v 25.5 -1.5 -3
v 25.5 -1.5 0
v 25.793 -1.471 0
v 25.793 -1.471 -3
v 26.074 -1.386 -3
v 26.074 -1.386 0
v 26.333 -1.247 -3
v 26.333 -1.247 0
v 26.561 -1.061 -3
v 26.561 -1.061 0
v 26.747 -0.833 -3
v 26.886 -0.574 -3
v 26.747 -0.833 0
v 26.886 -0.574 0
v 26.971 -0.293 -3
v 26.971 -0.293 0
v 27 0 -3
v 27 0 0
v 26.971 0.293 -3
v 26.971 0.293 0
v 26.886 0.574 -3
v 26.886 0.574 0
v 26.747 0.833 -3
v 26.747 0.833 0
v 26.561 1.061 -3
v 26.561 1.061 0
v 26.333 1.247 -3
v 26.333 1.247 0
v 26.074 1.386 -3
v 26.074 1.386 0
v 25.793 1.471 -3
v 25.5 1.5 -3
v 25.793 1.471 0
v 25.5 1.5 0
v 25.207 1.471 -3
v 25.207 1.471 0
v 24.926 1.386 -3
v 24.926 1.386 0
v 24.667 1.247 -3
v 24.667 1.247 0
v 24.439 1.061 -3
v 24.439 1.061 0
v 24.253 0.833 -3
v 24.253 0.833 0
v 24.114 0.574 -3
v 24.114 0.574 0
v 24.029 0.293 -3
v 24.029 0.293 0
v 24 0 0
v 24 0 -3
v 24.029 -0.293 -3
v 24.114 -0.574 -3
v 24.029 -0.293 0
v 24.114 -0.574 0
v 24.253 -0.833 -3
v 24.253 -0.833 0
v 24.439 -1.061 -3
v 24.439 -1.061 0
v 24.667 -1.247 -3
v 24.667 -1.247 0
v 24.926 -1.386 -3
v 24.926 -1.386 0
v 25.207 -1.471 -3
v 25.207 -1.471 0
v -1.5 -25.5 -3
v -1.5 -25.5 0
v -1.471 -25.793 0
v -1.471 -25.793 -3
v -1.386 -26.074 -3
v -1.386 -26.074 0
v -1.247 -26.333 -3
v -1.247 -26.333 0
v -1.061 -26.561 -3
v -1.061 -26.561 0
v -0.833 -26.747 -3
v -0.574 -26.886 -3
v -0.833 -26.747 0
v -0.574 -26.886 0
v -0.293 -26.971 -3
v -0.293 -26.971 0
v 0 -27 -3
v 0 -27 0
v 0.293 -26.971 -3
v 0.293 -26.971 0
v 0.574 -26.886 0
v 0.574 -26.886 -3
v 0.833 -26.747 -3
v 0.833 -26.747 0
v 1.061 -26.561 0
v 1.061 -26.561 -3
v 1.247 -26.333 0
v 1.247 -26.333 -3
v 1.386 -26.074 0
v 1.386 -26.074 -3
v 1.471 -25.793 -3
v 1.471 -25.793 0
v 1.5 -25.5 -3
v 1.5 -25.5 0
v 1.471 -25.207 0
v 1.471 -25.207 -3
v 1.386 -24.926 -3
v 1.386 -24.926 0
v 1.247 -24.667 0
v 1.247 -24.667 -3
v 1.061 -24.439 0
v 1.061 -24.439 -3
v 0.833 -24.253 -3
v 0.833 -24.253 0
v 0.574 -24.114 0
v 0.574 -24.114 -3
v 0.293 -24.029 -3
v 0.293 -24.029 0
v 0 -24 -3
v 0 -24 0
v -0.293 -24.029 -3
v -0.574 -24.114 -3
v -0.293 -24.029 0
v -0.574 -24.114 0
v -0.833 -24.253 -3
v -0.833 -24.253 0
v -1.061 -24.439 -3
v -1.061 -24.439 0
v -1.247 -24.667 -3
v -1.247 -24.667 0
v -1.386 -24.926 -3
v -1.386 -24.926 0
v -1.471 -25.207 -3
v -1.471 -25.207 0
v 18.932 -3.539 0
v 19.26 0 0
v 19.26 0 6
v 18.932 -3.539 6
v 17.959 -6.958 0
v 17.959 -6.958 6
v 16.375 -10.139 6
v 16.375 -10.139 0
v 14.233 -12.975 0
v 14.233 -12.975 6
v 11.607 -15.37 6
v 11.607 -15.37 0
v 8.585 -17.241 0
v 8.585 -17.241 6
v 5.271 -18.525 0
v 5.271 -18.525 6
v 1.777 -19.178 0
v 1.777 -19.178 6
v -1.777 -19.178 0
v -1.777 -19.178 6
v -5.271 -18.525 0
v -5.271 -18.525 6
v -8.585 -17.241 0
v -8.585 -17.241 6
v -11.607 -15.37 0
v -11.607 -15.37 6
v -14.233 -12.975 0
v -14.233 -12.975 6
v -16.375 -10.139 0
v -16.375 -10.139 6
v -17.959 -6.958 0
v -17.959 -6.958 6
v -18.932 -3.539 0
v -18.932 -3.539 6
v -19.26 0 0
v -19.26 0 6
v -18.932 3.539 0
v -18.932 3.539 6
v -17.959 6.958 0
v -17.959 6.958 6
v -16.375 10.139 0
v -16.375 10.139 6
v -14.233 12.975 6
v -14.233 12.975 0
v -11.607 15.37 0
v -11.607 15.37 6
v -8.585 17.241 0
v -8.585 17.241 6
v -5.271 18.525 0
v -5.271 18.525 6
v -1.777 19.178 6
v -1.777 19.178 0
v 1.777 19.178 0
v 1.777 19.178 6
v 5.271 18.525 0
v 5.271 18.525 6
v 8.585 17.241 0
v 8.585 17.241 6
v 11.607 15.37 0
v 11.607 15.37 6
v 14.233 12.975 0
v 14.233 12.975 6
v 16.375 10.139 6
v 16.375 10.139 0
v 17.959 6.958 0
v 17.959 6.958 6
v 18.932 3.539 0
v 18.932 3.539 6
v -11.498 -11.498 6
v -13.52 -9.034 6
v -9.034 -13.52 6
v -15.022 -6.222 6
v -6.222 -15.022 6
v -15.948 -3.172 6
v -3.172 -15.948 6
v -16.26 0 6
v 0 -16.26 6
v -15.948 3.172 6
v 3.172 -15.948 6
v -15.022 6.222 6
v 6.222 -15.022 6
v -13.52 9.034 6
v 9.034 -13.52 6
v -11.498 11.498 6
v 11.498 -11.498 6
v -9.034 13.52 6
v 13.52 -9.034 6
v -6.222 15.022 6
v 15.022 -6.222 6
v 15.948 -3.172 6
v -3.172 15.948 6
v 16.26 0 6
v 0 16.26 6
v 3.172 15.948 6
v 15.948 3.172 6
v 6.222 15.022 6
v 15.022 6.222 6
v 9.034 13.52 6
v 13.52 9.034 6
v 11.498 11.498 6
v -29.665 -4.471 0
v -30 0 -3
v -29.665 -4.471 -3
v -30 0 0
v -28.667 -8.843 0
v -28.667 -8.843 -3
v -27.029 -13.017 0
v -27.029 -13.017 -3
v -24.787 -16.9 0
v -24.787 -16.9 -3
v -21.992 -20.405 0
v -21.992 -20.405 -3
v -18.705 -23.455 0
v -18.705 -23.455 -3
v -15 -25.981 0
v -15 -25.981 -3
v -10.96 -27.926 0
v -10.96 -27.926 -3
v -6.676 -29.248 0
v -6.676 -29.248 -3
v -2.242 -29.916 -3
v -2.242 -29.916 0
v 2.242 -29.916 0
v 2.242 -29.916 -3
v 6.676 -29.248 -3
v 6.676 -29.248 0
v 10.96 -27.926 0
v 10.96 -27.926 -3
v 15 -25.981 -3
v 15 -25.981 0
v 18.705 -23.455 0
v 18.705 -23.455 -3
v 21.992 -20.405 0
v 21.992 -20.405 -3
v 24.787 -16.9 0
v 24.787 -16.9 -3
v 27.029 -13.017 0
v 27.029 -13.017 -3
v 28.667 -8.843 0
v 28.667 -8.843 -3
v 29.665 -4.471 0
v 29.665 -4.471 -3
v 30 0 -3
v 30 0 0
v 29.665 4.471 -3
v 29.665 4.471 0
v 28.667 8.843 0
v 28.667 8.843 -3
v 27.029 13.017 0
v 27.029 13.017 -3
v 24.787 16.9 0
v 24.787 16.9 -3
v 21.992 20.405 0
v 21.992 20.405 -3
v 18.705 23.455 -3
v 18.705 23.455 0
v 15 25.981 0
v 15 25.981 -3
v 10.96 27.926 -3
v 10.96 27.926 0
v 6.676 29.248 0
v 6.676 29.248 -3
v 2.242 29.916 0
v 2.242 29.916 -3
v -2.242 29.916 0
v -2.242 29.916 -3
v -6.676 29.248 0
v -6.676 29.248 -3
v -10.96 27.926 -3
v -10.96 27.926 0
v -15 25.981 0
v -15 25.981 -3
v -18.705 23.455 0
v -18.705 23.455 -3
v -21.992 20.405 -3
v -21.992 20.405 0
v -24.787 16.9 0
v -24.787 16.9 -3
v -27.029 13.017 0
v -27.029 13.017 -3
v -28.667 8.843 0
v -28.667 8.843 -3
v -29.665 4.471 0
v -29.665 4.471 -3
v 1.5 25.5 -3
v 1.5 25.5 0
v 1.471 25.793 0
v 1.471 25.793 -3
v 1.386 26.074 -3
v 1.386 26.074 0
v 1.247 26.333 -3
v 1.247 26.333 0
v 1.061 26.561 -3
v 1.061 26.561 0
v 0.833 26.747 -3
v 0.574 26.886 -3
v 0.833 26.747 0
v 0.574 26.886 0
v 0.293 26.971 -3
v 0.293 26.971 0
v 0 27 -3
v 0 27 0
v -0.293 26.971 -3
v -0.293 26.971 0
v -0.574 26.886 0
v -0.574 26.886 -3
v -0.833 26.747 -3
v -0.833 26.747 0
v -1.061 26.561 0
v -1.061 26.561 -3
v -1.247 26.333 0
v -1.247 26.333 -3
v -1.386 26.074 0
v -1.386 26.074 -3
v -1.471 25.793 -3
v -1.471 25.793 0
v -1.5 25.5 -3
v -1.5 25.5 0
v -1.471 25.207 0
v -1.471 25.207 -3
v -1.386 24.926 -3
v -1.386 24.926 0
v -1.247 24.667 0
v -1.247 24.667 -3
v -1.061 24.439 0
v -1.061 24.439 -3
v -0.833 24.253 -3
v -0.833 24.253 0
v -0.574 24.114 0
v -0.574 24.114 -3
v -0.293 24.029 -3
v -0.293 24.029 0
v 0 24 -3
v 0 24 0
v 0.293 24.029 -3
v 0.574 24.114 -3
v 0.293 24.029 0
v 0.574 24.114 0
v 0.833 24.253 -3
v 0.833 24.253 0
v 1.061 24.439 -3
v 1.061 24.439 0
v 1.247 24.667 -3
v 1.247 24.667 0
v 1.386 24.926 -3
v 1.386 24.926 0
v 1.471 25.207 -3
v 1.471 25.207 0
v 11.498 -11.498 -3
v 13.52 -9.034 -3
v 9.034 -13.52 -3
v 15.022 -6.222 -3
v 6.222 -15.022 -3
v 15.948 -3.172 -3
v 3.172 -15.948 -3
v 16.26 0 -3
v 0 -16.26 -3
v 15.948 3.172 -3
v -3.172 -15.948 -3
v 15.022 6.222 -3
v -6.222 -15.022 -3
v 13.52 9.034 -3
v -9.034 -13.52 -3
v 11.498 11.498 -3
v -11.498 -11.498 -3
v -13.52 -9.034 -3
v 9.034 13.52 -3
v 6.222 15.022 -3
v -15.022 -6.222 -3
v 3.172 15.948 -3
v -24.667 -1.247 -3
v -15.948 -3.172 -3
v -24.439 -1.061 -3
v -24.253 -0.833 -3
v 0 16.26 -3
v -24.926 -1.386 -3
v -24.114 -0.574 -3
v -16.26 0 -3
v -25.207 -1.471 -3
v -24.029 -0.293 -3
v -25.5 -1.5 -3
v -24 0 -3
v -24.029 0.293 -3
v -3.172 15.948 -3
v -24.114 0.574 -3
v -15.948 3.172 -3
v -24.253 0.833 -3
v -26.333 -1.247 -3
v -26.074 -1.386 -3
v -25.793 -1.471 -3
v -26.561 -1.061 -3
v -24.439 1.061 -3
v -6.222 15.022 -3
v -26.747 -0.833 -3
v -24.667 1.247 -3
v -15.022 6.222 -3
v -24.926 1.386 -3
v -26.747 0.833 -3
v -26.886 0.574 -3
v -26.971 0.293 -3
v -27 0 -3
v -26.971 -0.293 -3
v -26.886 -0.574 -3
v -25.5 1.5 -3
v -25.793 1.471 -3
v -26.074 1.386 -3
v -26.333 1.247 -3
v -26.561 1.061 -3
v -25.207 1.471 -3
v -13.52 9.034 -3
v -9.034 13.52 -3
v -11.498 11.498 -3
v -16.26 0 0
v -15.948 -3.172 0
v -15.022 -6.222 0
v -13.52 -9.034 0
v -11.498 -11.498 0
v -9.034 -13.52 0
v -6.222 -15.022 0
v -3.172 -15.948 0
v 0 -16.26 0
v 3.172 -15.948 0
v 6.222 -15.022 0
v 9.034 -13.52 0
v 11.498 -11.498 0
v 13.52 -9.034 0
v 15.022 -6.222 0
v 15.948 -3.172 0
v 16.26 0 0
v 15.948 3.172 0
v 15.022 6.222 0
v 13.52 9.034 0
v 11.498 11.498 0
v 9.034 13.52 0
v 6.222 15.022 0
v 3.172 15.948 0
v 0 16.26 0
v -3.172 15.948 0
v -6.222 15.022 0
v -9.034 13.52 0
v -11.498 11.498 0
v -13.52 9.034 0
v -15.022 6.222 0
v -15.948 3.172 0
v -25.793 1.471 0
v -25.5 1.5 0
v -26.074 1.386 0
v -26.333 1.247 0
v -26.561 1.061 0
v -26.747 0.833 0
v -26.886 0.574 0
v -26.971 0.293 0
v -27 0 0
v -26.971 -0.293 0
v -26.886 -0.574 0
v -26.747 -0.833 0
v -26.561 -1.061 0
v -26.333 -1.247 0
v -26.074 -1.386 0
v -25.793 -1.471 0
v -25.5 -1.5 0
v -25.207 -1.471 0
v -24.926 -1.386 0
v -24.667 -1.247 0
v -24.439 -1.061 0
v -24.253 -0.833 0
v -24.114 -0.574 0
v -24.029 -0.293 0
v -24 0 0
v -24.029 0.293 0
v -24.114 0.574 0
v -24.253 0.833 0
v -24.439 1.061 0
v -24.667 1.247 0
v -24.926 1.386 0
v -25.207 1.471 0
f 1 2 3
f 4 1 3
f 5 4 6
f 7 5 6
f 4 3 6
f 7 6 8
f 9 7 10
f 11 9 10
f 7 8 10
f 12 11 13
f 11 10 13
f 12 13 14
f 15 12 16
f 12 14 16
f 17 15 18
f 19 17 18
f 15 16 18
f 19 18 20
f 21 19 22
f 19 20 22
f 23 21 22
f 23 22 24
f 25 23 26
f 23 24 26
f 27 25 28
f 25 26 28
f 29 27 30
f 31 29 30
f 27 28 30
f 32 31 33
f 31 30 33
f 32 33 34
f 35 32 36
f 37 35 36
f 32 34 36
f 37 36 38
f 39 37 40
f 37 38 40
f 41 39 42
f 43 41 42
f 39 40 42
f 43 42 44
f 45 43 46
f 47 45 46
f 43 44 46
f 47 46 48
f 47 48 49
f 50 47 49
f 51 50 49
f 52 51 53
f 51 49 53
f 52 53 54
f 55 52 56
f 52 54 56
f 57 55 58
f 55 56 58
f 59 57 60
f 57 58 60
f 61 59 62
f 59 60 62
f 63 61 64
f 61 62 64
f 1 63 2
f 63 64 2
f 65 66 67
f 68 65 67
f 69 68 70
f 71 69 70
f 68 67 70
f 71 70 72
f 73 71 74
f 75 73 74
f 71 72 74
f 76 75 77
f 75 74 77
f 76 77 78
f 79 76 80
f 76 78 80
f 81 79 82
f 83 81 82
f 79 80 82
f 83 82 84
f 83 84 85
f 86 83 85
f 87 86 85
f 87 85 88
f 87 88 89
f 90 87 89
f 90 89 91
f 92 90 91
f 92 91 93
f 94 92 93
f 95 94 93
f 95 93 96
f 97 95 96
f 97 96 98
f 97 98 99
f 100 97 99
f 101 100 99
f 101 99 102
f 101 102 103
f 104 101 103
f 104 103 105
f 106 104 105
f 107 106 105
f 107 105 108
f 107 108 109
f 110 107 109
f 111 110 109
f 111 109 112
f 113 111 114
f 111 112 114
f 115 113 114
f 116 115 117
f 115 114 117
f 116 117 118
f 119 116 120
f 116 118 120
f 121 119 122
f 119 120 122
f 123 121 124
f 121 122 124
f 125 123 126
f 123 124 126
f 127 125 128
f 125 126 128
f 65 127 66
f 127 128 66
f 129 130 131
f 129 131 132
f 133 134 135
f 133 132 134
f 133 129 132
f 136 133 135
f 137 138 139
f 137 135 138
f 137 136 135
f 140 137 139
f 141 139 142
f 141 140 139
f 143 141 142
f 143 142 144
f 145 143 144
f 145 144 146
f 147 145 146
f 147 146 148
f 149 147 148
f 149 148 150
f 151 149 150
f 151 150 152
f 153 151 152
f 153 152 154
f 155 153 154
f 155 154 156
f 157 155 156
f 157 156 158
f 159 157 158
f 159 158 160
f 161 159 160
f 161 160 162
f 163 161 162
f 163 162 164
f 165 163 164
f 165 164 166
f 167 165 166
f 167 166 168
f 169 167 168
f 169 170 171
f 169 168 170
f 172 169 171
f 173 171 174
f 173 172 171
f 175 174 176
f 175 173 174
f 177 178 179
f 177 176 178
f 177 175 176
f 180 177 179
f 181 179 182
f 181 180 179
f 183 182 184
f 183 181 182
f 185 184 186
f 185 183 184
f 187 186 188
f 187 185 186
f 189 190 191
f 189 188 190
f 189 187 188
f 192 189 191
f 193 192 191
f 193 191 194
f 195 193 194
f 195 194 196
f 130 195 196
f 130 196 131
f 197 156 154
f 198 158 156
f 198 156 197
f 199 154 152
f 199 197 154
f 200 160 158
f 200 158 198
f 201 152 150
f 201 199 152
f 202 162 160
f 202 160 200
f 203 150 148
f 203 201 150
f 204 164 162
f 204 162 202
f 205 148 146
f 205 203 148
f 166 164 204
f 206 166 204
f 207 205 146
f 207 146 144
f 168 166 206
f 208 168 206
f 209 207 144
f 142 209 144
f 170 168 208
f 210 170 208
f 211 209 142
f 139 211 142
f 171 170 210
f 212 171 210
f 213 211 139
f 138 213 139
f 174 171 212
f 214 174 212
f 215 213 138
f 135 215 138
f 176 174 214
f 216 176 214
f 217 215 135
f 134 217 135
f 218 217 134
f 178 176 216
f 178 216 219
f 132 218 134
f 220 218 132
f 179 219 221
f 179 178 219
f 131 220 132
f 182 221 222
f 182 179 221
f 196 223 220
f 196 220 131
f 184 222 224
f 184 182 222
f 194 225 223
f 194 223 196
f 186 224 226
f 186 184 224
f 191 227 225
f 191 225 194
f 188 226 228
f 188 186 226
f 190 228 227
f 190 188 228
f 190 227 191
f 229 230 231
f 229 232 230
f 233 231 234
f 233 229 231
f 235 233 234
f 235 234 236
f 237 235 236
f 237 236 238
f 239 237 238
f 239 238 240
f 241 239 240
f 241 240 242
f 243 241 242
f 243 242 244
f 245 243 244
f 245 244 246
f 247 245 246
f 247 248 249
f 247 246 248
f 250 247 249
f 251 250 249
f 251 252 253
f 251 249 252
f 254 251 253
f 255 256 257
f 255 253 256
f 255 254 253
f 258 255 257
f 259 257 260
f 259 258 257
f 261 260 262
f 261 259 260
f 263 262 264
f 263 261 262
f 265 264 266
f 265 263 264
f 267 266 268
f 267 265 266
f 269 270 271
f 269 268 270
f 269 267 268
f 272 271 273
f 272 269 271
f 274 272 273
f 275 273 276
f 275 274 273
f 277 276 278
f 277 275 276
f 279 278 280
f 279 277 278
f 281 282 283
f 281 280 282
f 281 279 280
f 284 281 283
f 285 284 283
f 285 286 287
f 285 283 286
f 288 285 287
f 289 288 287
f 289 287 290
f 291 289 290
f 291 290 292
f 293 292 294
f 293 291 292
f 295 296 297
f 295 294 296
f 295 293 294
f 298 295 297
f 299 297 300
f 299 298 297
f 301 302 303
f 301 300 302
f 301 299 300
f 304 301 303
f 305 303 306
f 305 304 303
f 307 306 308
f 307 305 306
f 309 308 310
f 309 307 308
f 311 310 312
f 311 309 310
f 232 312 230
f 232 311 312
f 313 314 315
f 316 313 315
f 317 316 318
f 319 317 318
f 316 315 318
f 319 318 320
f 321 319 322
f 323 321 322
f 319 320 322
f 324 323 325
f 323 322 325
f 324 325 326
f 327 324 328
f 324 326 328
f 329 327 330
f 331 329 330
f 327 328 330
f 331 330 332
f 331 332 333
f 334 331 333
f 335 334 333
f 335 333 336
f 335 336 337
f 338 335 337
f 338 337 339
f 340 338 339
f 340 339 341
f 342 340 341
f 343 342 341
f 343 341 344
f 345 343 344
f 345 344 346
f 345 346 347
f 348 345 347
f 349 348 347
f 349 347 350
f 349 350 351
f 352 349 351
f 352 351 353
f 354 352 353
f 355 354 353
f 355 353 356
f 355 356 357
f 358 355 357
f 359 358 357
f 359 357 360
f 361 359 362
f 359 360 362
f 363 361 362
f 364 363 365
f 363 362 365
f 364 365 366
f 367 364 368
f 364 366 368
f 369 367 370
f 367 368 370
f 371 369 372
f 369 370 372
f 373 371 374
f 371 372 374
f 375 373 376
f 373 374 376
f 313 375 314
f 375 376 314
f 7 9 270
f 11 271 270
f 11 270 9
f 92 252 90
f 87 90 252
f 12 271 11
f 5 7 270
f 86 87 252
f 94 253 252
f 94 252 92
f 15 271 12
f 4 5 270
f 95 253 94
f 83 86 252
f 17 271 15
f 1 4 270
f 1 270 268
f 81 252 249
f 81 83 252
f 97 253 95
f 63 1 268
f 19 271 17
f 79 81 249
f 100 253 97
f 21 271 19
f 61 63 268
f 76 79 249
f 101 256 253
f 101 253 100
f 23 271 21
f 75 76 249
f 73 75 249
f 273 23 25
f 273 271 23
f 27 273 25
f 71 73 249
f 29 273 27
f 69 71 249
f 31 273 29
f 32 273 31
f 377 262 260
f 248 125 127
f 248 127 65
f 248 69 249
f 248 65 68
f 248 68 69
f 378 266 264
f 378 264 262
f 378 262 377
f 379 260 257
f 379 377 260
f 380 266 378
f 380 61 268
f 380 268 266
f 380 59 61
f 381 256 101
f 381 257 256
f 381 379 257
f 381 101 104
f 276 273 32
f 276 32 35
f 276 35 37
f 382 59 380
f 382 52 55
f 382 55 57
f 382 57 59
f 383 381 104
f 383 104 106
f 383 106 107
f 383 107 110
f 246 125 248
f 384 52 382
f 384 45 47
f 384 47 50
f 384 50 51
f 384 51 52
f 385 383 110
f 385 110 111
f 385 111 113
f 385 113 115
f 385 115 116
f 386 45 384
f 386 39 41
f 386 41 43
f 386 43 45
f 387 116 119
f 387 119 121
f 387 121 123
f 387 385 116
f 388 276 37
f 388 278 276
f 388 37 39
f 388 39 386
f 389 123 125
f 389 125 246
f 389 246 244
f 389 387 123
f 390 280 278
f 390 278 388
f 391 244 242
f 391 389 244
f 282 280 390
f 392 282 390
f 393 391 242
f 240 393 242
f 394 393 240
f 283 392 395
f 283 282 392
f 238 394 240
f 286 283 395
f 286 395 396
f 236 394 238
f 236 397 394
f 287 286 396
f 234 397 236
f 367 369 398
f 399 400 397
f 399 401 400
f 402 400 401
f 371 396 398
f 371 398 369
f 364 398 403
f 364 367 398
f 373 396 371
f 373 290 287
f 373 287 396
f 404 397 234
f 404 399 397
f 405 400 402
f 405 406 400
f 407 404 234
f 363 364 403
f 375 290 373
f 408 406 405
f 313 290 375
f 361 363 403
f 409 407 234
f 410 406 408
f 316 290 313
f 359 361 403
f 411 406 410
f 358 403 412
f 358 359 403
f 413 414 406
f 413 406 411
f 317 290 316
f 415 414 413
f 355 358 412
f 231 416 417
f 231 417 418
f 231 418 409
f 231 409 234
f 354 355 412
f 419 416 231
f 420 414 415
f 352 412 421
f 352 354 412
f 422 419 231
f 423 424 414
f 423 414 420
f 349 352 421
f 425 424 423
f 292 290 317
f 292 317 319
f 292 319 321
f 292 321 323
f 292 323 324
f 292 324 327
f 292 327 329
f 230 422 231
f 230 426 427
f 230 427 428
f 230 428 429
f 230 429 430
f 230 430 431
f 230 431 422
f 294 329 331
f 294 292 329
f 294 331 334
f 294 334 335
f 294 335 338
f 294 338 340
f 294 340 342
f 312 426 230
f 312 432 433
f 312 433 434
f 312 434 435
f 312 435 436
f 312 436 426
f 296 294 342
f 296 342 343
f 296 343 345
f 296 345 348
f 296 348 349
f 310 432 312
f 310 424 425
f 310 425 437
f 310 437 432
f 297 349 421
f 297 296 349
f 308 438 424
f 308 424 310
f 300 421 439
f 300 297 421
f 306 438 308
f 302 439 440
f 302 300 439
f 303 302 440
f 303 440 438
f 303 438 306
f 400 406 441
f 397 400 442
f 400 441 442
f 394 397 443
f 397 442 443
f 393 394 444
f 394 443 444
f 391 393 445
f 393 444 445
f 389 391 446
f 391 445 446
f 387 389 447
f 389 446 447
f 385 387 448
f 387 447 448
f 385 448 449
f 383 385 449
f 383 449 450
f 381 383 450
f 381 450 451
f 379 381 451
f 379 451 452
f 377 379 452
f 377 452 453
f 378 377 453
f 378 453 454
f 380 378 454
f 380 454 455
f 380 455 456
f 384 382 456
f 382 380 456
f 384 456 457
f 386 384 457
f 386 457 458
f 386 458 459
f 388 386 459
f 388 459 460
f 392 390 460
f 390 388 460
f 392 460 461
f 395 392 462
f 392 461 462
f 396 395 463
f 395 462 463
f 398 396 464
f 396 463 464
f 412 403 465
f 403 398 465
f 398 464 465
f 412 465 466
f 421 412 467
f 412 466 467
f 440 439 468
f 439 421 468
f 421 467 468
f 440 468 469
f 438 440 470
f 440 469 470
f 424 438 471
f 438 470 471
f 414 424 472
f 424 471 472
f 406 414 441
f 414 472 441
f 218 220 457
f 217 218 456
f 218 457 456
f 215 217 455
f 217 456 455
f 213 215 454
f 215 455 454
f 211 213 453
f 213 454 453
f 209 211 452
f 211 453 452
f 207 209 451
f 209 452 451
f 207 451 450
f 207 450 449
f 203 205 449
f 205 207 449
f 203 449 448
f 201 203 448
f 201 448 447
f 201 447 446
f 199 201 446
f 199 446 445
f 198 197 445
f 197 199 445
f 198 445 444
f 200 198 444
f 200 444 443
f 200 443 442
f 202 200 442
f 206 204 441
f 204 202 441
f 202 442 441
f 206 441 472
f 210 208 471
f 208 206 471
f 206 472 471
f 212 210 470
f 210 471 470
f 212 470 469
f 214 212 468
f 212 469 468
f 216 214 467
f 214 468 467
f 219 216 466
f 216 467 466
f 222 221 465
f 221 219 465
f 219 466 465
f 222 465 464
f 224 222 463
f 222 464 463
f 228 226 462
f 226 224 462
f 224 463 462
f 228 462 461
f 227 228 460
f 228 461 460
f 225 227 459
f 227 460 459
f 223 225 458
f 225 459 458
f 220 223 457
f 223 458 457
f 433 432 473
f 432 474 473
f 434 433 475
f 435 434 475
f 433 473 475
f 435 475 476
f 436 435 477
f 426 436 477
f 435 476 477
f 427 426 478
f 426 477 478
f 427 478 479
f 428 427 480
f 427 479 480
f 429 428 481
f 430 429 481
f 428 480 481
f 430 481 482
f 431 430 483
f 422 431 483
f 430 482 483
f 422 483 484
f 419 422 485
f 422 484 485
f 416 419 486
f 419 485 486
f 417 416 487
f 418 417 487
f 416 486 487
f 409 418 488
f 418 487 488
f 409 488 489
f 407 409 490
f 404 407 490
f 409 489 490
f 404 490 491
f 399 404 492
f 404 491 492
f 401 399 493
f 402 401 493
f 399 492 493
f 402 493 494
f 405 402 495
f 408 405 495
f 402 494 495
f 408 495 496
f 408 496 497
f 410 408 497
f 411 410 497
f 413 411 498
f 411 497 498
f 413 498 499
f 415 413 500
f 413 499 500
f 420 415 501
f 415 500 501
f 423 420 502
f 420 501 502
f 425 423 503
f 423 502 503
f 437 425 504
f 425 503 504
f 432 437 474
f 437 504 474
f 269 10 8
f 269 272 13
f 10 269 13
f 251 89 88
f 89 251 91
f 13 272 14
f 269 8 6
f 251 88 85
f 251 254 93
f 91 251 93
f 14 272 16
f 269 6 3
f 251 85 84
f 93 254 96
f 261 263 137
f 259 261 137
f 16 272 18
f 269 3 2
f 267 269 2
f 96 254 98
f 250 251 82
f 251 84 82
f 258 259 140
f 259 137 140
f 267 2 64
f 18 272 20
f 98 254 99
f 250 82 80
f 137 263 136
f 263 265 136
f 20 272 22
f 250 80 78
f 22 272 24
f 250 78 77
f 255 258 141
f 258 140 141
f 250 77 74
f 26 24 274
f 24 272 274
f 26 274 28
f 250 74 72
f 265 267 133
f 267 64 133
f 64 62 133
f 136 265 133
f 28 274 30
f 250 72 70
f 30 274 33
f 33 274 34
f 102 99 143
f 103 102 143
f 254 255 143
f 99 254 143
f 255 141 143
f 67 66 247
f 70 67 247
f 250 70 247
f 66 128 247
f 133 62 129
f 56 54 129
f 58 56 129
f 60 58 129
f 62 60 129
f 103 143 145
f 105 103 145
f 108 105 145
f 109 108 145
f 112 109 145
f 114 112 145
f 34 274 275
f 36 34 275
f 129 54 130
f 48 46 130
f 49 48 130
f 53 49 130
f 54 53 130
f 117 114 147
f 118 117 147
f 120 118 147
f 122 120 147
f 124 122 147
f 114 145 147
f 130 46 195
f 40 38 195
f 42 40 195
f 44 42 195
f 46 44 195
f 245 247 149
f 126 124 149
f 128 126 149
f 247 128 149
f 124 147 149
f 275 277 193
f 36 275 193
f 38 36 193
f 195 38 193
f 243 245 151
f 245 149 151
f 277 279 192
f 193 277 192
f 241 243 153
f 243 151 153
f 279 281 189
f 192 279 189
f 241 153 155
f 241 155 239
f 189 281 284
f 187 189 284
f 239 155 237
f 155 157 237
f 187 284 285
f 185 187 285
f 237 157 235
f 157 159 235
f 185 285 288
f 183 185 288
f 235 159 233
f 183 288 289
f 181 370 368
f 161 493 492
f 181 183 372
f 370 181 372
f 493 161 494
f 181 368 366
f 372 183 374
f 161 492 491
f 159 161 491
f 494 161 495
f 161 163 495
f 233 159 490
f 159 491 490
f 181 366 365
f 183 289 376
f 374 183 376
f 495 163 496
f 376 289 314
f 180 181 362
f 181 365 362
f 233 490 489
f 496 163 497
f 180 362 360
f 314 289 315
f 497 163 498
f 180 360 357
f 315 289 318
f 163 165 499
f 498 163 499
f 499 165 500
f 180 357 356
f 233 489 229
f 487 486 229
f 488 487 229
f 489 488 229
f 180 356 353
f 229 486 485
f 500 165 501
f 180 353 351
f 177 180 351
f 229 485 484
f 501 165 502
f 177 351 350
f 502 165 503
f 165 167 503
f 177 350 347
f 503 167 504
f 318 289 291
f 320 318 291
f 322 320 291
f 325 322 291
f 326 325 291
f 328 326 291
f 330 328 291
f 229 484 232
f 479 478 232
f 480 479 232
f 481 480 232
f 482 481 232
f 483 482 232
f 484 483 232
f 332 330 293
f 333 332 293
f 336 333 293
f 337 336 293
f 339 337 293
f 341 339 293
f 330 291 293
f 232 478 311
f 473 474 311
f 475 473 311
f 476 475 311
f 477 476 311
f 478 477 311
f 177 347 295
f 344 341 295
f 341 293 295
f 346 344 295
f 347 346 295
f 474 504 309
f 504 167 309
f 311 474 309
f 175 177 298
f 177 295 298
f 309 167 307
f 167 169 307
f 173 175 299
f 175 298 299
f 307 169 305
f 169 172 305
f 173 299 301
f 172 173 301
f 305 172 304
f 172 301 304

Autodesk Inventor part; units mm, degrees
ref_plane "YZ Plane" through (0, 0, 0) normal (1, 0, 0) x (0, 1, 0)
ref_plane "XZ Plane" through (0, 0, 0) normal (0, 1, 0) x (-1, 0, 0)
ref_plane "XY Plane" through (0, 0, 0) normal (0, 0, 1) x (1, 0, 0)
sketch "Boceto1" plane through (0, 0, 0) normal (0, 0, 1) x (1, 0, 0)
  circle A0 centre (0, 0) radius 16.26
  circle A1 centre (0, 0) radius 19.26
  dimension "d0" = 32.52
  dimension "d1" = 3
extrude "Extrusión1" add sketch "Boceto1" along normal blind 6
sketch "Boceto2" plane through (0, 0, 0) normal (0, 0, -1) x (-1, 0, 0)
  circle A0 centre (0, 0) radius 30
  circle A1 centre (0, 0) radius 16.26 projected
  dimension "d4" = 60
extrude "Extrusión2" add sketch "Boceto2" along normal blind 3
sketch "Boceto3" plane through (0, 0, 0) normal (0, 0, 1) x (1, 0, 0)
  circle A0 centre (0, 0) radius 30 projected
  circle A1 centre (0, 25.5) radius 1.5
  dimension "d7" = 3
  dimension "d8" = 25.5
  dimension "d9" = 60
extrude "Extrusión3" cut sketch "Boceto3" against normal blind 3 contours A1
pattern_circular "Patrón circular1" count 4 over 360 about axis through (0, 0, -10) along (0, 0, 1) of "Extrusión3"
properties part number "Acople N°1"
